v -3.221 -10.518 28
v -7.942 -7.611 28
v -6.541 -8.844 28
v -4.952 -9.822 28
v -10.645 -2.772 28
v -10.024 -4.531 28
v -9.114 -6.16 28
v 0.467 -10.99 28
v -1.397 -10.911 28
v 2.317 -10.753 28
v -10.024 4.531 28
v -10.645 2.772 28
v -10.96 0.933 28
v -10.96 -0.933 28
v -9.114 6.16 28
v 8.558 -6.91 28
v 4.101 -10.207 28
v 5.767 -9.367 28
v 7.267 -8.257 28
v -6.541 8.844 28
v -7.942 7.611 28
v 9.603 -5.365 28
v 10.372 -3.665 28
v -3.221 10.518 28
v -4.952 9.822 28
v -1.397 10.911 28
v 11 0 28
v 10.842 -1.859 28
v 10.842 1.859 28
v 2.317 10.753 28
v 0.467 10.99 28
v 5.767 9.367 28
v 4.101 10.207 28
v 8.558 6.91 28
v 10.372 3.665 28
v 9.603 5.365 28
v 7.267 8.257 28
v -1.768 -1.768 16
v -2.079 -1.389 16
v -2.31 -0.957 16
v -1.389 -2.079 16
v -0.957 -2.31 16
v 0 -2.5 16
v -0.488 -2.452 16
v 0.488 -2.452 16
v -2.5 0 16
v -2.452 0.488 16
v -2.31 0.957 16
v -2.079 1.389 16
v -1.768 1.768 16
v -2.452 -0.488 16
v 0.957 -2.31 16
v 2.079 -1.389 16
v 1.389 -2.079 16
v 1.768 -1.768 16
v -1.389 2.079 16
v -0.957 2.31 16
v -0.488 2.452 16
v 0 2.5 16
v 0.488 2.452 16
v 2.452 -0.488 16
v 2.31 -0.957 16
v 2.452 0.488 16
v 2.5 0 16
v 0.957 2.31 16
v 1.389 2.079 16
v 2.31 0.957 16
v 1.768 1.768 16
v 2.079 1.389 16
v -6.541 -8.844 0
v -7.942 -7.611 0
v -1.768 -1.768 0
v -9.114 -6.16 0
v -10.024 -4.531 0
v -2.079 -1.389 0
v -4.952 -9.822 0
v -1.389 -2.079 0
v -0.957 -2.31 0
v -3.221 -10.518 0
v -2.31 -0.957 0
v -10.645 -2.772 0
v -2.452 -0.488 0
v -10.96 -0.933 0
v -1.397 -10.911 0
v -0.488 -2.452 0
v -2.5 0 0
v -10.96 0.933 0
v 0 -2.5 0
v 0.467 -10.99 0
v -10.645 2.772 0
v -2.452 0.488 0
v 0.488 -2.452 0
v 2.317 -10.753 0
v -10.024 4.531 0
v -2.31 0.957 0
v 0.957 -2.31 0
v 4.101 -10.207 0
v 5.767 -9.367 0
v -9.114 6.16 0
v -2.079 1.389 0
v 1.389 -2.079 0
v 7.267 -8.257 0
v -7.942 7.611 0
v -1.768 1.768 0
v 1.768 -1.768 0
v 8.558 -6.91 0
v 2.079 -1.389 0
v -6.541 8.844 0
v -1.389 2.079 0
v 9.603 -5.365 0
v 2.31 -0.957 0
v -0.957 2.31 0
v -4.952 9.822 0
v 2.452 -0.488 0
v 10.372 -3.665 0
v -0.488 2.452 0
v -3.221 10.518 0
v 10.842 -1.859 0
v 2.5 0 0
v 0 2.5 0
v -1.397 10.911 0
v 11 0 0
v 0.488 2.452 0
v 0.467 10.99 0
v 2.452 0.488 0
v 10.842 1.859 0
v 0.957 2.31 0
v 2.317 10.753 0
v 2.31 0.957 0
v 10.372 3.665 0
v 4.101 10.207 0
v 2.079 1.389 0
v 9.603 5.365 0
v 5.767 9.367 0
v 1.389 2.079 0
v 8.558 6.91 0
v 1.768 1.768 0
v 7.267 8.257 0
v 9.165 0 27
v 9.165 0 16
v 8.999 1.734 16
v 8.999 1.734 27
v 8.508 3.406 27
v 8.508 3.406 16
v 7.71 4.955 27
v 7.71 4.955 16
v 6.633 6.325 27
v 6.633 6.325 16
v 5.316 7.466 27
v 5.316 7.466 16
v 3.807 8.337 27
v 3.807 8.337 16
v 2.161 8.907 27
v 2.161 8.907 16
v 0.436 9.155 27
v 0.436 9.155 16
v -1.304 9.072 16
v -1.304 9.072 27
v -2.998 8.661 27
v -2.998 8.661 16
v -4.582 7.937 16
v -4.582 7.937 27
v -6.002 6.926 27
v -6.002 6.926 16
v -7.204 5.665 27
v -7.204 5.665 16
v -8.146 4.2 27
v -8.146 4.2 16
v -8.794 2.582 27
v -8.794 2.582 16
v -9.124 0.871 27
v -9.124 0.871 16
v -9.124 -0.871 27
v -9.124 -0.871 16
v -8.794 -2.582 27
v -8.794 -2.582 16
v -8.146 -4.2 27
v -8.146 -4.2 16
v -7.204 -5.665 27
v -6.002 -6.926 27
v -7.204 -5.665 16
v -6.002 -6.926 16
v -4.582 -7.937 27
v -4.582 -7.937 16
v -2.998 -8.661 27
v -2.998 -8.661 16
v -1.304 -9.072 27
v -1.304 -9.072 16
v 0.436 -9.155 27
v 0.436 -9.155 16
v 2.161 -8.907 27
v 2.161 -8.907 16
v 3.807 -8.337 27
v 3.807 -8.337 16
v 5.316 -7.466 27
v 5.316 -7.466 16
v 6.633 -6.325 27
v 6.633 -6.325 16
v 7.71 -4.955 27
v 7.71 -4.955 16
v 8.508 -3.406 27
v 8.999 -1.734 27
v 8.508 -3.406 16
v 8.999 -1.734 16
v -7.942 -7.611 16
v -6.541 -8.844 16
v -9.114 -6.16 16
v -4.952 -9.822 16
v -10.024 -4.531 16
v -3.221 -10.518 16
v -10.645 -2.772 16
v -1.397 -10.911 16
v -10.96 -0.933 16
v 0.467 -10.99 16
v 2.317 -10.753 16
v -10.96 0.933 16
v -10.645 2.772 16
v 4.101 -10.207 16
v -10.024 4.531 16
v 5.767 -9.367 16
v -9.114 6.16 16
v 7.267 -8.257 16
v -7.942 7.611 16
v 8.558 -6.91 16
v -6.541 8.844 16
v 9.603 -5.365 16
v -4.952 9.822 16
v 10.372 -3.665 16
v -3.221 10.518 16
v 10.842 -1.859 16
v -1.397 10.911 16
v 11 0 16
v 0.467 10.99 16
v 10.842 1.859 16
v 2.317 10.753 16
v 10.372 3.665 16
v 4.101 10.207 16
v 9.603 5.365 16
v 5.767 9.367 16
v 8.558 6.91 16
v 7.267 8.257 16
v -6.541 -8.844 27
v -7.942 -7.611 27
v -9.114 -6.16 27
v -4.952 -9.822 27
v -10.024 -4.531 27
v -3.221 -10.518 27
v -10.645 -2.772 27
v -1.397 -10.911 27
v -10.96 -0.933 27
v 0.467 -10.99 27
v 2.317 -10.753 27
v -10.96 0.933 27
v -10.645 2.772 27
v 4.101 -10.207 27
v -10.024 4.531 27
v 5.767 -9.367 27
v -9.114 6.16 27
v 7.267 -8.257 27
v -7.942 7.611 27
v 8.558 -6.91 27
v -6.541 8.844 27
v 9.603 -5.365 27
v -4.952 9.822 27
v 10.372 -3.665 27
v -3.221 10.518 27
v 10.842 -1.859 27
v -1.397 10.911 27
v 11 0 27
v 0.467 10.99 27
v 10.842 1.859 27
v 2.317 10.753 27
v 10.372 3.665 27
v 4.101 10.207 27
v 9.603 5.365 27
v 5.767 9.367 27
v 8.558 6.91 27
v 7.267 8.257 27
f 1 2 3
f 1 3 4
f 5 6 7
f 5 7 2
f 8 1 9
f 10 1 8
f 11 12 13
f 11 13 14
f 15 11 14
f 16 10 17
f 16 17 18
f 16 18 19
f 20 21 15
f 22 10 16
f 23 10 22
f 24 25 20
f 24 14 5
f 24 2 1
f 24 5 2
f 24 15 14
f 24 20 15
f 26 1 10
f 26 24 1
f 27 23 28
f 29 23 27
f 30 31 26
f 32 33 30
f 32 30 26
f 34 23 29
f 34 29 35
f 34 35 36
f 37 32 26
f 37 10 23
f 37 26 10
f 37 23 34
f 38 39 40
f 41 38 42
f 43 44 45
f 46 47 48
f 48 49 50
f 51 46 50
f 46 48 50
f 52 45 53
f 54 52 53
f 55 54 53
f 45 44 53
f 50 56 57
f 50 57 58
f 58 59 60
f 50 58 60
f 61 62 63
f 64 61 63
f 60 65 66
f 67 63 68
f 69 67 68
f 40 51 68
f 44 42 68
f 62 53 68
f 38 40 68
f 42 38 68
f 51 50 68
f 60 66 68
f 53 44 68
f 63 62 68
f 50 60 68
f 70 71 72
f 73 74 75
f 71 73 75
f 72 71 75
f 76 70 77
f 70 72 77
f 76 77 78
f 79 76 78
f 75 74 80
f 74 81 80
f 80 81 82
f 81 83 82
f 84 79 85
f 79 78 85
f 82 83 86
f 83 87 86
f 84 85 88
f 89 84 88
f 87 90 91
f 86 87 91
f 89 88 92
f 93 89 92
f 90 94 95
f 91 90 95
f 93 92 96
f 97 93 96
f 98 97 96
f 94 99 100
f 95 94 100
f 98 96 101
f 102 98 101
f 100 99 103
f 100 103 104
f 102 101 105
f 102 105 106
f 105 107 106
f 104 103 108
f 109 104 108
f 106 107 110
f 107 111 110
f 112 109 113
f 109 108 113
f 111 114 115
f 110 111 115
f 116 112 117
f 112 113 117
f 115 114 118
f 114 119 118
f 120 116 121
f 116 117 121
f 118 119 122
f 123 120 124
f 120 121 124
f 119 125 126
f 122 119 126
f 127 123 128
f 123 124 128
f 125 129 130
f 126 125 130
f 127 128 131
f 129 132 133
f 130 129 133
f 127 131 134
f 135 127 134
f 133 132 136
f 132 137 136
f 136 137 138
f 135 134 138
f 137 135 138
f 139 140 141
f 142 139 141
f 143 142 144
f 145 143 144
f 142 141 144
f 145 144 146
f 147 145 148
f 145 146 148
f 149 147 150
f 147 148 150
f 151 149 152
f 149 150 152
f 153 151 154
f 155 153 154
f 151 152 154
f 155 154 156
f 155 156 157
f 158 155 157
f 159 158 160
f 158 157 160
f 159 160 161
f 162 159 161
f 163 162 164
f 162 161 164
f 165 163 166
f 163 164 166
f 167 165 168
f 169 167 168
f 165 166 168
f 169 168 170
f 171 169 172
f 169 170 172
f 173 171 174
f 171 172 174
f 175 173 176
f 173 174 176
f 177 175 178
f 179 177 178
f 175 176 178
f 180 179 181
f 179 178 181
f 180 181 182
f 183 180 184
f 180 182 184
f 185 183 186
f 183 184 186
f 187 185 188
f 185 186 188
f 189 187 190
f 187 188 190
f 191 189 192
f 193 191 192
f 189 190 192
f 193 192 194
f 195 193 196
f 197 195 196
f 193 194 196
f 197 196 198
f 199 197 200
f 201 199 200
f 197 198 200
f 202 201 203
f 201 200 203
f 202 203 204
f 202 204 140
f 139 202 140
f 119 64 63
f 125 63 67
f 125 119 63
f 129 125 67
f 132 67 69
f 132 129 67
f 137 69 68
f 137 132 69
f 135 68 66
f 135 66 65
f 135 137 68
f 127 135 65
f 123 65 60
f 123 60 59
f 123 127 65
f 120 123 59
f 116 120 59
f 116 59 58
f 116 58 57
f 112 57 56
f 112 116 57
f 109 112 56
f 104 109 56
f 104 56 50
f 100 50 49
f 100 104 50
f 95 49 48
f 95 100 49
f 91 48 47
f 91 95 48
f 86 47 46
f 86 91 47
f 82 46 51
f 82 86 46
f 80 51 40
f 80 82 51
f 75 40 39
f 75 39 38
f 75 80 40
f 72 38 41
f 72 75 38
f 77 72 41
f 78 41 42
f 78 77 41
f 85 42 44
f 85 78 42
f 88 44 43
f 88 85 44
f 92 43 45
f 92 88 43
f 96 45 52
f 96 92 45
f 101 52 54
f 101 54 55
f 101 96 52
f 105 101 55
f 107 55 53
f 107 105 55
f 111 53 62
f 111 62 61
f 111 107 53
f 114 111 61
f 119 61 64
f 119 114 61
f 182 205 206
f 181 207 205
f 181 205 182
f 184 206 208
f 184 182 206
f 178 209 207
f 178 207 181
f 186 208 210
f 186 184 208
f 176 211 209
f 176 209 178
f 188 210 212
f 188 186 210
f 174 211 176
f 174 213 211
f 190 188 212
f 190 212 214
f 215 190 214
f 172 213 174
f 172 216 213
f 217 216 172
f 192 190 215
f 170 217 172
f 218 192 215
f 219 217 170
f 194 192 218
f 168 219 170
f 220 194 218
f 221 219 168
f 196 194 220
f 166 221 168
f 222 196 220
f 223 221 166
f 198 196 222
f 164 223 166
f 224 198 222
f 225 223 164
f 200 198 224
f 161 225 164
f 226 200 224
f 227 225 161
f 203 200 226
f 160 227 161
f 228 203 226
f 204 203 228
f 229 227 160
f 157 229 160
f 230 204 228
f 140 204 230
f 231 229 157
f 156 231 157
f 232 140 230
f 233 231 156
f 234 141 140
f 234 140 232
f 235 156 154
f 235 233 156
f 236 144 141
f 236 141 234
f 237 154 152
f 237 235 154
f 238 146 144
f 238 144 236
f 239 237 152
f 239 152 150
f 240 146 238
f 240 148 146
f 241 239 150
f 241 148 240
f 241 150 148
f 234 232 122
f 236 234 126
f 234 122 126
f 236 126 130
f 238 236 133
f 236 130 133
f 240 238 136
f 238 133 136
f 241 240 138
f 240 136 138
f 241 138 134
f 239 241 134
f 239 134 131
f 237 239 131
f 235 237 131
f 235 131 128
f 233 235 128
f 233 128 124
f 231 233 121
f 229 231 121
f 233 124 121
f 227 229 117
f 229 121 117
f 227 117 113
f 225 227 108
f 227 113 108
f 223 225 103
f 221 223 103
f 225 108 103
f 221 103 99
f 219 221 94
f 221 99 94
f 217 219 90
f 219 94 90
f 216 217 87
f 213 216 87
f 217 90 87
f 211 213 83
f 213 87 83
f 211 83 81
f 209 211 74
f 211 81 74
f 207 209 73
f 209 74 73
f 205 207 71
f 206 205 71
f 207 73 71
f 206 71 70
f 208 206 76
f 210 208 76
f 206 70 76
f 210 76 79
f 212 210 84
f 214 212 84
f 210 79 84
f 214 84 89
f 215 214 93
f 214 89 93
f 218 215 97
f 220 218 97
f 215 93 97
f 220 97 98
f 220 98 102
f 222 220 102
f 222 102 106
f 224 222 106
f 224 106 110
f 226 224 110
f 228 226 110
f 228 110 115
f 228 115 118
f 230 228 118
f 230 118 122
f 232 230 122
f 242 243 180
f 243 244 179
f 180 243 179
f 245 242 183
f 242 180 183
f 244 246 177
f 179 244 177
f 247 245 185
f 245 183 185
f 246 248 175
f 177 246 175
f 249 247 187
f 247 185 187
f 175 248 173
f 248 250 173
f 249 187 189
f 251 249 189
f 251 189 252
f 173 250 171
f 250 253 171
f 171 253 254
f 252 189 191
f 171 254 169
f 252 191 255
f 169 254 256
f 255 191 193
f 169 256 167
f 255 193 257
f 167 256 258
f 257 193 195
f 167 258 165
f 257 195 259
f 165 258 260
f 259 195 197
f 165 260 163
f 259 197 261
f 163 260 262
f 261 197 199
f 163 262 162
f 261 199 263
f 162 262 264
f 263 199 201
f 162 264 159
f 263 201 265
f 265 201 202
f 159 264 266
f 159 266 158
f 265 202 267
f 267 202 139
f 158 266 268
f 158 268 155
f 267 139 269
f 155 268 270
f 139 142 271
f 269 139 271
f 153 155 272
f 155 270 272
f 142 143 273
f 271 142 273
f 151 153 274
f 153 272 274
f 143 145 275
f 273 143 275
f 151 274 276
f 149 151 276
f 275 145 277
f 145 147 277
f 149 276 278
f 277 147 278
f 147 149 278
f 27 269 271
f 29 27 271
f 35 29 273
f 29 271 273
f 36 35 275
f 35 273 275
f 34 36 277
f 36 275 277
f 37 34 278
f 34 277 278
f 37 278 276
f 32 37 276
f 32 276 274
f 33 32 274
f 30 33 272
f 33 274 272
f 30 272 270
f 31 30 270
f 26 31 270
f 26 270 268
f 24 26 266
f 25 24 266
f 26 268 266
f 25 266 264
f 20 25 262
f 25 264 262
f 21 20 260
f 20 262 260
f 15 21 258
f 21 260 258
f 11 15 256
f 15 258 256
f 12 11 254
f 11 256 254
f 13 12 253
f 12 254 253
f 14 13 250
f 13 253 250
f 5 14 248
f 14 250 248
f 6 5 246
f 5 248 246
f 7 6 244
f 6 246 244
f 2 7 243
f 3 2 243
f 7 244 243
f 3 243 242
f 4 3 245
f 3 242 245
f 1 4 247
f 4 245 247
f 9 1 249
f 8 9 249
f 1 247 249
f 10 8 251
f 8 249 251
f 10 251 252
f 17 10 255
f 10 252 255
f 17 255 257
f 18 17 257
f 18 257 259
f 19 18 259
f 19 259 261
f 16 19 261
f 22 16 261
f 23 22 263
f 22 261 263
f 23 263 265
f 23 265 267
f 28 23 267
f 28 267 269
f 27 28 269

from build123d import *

# Parameters (mm, degrees)
SKETCH_1_R      = 11
SKETCH_1_R_2    = 2.5
EXTRUDE_1_DEPTH = 16
SKETCH_2_R      = 9.165
EXTRUDE_2_DEPTH = 11
SKETCH_3_R      = 11
EXTRUDE_3_DEPTH = 1


with BuildPart() as part:
    # 草图1 → 凸台-拉伸1 (new body)
    with BuildSketch(Plane.XY):
        Circle(SKETCH_1_R)
        Circle(SKETCH_1_R_2, mode=Mode.SUBTRACT)
    extrude(amount=EXTRUDE_1_DEPTH)

    # 草图2 → 凸台-拉伸2 (add)
    with BuildSketch(Plane.XY.offset(16)):
        Circle(SKETCH_2_R)
    extrude(amount=EXTRUDE_2_DEPTH)

    # 草图3 → 凸台-拉伸3 (add)
    with BuildSketch(Plane.XY.offset(27)):
        Circle(SKETCH_3_R)
    extrude(amount=EXTRUDE_3_DEPTH)


solid = part.part
